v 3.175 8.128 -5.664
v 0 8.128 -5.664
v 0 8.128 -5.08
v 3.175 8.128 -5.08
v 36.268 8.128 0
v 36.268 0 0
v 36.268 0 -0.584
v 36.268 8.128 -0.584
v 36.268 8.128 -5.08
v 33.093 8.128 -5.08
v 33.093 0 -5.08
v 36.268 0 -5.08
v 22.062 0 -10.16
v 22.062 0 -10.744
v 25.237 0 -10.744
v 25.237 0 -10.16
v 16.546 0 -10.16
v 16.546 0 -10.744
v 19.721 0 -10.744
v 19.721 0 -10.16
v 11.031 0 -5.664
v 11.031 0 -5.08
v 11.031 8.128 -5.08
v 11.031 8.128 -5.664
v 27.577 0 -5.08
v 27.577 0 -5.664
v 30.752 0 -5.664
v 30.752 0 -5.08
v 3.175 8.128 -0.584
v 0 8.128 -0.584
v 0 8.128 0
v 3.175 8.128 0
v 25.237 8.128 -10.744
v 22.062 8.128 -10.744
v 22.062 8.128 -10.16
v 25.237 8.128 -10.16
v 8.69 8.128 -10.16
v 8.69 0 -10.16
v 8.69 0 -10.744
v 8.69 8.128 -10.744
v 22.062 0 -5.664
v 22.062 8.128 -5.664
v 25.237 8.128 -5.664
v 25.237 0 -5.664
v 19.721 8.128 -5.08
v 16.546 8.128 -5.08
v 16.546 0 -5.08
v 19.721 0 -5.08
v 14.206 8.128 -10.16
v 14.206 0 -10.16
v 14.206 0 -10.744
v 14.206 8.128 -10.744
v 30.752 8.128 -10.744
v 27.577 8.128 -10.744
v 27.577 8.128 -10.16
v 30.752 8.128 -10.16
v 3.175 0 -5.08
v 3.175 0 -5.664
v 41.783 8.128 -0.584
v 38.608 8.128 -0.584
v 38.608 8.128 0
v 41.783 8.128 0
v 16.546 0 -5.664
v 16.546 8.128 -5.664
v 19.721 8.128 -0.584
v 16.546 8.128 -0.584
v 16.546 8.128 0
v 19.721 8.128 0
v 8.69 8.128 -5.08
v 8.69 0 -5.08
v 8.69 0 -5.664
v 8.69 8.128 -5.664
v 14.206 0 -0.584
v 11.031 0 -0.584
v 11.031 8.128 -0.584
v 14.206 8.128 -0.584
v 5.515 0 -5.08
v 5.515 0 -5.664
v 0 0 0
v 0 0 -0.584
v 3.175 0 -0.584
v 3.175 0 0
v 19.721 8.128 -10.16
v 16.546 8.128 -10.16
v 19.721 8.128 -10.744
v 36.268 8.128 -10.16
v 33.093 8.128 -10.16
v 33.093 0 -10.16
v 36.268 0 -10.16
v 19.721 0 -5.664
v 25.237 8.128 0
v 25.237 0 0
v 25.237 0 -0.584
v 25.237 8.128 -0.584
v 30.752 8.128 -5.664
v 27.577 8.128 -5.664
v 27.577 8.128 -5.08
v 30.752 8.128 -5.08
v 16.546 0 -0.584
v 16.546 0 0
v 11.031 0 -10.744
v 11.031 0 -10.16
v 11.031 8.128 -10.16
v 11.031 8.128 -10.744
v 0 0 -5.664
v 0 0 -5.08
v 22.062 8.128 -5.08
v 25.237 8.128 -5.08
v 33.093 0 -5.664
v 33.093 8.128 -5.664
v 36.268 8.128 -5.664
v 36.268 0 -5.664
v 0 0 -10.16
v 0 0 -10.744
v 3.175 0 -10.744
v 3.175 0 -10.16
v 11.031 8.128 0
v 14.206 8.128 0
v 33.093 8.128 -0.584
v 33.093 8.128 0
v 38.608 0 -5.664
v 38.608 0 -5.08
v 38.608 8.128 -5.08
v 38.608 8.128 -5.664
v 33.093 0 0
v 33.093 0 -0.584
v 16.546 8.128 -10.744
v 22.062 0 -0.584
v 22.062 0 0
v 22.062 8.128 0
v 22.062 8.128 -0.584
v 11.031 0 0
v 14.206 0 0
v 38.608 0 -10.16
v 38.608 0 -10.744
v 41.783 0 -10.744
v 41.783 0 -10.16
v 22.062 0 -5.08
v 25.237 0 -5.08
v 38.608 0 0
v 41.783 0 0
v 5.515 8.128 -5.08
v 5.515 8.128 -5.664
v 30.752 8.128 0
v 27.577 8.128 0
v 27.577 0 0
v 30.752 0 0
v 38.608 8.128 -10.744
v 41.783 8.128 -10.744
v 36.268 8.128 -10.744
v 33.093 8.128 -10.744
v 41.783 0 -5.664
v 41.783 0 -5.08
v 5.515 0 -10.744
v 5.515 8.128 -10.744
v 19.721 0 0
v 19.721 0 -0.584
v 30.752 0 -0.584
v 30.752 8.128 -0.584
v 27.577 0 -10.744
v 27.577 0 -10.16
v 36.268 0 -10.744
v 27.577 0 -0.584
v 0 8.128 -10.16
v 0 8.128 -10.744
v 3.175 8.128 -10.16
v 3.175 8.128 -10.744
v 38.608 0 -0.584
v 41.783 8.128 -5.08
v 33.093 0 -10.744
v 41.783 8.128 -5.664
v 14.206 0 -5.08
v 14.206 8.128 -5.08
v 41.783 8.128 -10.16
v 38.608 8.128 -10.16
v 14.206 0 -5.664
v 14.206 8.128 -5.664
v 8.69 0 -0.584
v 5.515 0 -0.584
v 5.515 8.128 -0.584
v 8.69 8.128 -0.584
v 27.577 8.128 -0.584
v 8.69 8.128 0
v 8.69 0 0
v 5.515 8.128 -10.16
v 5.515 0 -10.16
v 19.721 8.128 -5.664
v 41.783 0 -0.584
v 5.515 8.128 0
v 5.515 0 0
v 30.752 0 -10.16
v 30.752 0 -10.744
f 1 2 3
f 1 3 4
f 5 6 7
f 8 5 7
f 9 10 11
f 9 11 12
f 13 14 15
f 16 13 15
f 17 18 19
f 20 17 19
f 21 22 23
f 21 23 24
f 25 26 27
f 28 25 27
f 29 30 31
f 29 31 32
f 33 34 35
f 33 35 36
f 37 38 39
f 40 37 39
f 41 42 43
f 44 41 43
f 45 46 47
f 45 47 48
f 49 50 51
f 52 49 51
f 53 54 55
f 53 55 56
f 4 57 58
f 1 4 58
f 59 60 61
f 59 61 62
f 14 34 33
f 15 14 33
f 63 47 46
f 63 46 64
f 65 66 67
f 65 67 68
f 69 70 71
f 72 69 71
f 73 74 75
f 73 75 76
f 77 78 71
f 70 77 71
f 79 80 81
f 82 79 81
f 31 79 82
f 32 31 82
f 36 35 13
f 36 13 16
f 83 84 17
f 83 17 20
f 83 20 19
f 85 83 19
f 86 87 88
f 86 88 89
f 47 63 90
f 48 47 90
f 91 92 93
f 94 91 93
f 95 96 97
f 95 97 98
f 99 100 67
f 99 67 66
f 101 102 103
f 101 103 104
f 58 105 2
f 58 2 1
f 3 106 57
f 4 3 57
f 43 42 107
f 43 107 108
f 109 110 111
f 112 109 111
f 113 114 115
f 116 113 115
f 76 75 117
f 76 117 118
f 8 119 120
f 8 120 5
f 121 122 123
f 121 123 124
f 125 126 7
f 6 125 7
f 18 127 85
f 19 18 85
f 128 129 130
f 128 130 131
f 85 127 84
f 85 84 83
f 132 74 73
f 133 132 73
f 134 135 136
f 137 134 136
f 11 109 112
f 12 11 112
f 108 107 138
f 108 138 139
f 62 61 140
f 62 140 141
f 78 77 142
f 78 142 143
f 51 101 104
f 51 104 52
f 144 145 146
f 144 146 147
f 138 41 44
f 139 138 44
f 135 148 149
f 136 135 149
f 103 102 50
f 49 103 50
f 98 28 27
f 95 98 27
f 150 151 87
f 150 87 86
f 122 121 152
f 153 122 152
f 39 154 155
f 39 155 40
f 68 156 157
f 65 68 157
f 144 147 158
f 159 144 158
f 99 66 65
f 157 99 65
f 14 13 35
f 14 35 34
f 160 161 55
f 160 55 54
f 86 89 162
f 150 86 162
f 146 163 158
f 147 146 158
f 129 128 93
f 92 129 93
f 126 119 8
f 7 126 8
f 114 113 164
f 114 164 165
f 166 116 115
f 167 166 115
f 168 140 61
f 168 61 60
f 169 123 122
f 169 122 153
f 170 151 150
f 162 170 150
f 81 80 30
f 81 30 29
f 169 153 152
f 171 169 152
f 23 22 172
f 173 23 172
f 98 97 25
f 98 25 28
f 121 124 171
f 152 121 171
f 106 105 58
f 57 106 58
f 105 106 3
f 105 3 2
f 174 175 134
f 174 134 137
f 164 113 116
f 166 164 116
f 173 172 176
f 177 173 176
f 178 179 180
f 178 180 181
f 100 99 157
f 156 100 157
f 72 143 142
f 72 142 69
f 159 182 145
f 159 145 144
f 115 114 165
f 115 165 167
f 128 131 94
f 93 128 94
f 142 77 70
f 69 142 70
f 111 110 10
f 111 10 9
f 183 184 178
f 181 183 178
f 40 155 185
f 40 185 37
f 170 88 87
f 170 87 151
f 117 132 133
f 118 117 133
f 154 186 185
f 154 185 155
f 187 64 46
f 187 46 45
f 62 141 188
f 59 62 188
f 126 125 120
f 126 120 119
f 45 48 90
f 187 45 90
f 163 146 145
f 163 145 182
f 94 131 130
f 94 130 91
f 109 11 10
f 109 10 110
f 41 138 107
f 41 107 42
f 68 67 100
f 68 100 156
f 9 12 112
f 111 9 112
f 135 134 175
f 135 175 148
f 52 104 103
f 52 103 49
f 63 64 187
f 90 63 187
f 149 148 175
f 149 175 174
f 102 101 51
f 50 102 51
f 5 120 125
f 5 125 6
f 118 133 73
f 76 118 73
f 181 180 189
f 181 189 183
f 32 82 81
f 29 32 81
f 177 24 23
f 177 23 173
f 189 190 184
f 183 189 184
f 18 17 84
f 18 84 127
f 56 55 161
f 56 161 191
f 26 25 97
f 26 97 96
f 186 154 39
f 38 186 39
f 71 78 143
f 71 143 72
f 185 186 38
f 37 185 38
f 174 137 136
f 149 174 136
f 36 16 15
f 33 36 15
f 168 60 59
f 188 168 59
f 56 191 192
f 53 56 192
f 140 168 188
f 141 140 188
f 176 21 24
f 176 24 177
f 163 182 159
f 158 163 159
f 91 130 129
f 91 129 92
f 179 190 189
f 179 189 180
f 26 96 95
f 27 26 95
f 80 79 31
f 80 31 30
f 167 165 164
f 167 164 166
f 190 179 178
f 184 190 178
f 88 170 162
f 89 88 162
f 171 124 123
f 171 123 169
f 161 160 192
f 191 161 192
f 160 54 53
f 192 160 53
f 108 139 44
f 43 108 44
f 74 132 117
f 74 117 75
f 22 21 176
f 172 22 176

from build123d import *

# Parameters (mm, degrees)
SKETCH1_W              = 3.175
SKETCH1_H              = 0.5842
BOSS_EXTRUDE1_DEPTH    = 8.128
BOSS_EXTRUDE1_2_DEPTH  = 8.128
BOSS_EXTRUDE1_3_DEPTH  = 8.128
BOSS_EXTRUDE1_4_DEPTH  = 8.128
BOSS_EXTRUDE1_5_DEPTH  = 8.128
BOSS_EXTRUDE1_6_DEPTH  = 8.128
BOSS_EXTRUDE1_7_DEPTH  = 8.128
BOSS_EXTRUDE1_8_DEPTH  = 8.128
BOSS_EXTRUDE1_9_DEPTH  = 8.128
BOSS_EXTRUDE1_10_DEPTH = 8.128
BOSS_EXTRUDE1_11_DEPTH = 8.128
BOSS_EXTRUDE1_12_DEPTH = 8.128
BOSS_EXTRUDE1_13_DEPTH = 8.128
BOSS_EXTRUDE1_14_DEPTH = 8.128
BOSS_EXTRUDE1_15_DEPTH = 8.128
BOSS_EXTRUDE1_16_DEPTH = 8.128
BOSS_EXTRUDE1_17_DEPTH = 8.128
BOSS_EXTRUDE1_18_DEPTH = 8.128
BOSS_EXTRUDE1_19_DEPTH = 8.128
BOSS_EXTRUDE1_20_DEPTH = 8.128
BOSS_EXTRUDE1_21_DEPTH = 8.128
BOSS_EXTRUDE1_22_DEPTH = 8.128
BOSS_EXTRUDE1_23_DEPTH = 8.128
BOSS_EXTRUDE1_24_DEPTH = 8.128


with BuildPart() as part:
    # Sketch1 → Boss-Extrude1 (new body)
    with BuildSketch(Plane(origin=(0, 0, 0), x_dir=(1, 0, 0), z_dir=(0, 1, 0))):
        with Locations((7.102928571, 0.2921)):
            Rectangle(SKETCH1_W, SKETCH1_H)
    extrude(amount=BOSS_EXTRUDE1_DEPTH)


with BuildPart() as body_2:
    # Sketch1 → Boss-Extrude1 2 (new body)
    with BuildSketch(Plane(origin=(0, 0, 0), x_dir=(1, 0, 0), z_dir=(0, 1, 0))):
        with Locations((1.5875, 0.2921)):
            Rectangle(SKETCH1_W, SKETCH1_H)
    extrude(amount=BOSS_EXTRUDE1_2_DEPTH)


with BuildPart() as body_3:
    # Sketch1 → Boss-Extrude1 3 (new body)
    with BuildSketch(Plane(origin=(0, 0, 0), x_dir=(1, 0, 0), z_dir=(0, 1, 0))):
        with Locations((12.618357143, 0.2921)):
            Rectangle(SKETCH1_W, SKETCH1_H)
    extrude(amount=BOSS_EXTRUDE1_3_DEPTH)


with BuildPart() as body_4:
    # Sketch1 → Boss-Extrude1 4 (new body)
    with BuildSketch(Plane(origin=(0, 0, 0), x_dir=(1, 0, 0), z_dir=(0, 1, 0))):
        with Locations((18.133785714, 0.2921)):
            Rectangle(SKETCH1_W, SKETCH1_H)
    extrude(amount=BOSS_EXTRUDE1_4_DEPTH)


with BuildPart() as body_5:
    # Sketch1 → Boss-Extrude1 5 (new body)
    with BuildSketch(Plane(origin=(0, 0, 0), x_dir=(1, 0, 0), z_dir=(0, 1, 0))):
        with Locations((23.649214286, 0.2921)):
            Rectangle(SKETCH1_W, SKETCH1_H)
    extrude(amount=BOSS_EXTRUDE1_5_DEPTH)


with BuildPart() as body_6:
    # Sketch1 → Boss-Extrude1 6 (new body)
    with BuildSketch(Plane(origin=(0, 0, 0), x_dir=(1, 0, 0), z_dir=(0, 1, 0))):
        with Locations((29.164642857, 0.2921)):
            Rectangle(SKETCH1_W, SKETCH1_H)
    extrude(amount=BOSS_EXTRUDE1_6_DEPTH)


with BuildPart() as body_7:
    # Sketch1 → Boss-Extrude1 7 (new body)
    with BuildSketch(Plane(origin=(0, 0, 0), x_dir=(1, 0, 0), z_dir=(0, 1, 0))):
        with Locations((34.680071429, 0.2921)):
            Rectangle(SKETCH1_W, SKETCH1_H)
    extrude(amount=BOSS_EXTRUDE1_7_DEPTH)


with BuildPart() as body_8:
    # Sketch1 → Boss-Extrude1 8 (new body)
    with BuildSketch(Plane(origin=(0, 0, 0), x_dir=(1, 0, 0), z_dir=(0, 1, 0))):
        with Locations((40.1955, 0.2921)):
            Rectangle(SKETCH1_W, SKETCH1_H)
    extrude(amount=BOSS_EXTRUDE1_8_DEPTH)


with BuildPart() as body_9:
    # Sketch1 → Boss-Extrude1 9 (new body)
    with BuildSketch(Plane(origin=(0, 0, 0), x_dir=(1, 0, 0), z_dir=(0, 1, 0))):
        with Locations((7.102928571, 5.3721)):
            Rectangle(SKETCH1_W, SKETCH1_H)
    extrude(amount=BOSS_EXTRUDE1_9_DEPTH)


with BuildPart() as body_10:
    # Sketch1 → Boss-Extrude1 10 (new body)
    with BuildSketch(Plane(origin=(0, 0, 0), x_dir=(1, 0, 0), z_dir=(0, 1, 0))):
        with Locations((1.5875, 5.3721)):
            Rectangle(SKETCH1_W, SKETCH1_H)
    extrude(amount=BOSS_EXTRUDE1_10_DEPTH)


with BuildPart() as body_11:
    # Sketch1 → Boss-Extrude1 11 (new body)
    with BuildSketch(Plane(origin=(0, 0, 0), x_dir=(1, 0, 0), z_dir=(0, 1, 0))):
        with Locations((12.618357143, 5.3721)):
            Rectangle(SKETCH1_W, SKETCH1_H)
    extrude(amount=BOSS_EXTRUDE1_11_DEPTH)


with BuildPart() as body_12:
    # Sketch1 → Boss-Extrude1 12 (new body)
    with BuildSketch(Plane(origin=(0, 0, 0), x_dir=(1, 0, 0), z_dir=(0, 1, 0))):
        with Locations((18.133785714, 5.3721)):
            Rectangle(SKETCH1_W, SKETCH1_H)
    extrude(amount=BOSS_EXTRUDE1_12_DEPTH)


with BuildPart() as body_13:
    # Sketch1 → Boss-Extrude1 13 (new body)
    with BuildSketch(Plane(origin=(0, 0, 0), x_dir=(1, 0, 0), z_dir=(0, 1, 0))):
        with Locations((23.649214286, 5.3721)):
            Rectangle(SKETCH1_W, SKETCH1_H)
    extrude(amount=BOSS_EXTRUDE1_13_DEPTH)


with BuildPart() as body_14:
    # Sketch1 → Boss-Extrude1 14 (new body)
    with BuildSketch(Plane(origin=(0, 0, 0), x_dir=(1, 0, 0), z_dir=(0, 1, 0))):
        with Locations((29.164642857, 5.3721)):
            Rectangle(SKETCH1_W, SKETCH1_H)
    extrude(amount=BOSS_EXTRUDE1_14_DEPTH)


with BuildPart() as body_15:
    # Sketch1 → Boss-Extrude1 15 (new body)
    with BuildSketch(Plane(origin=(0, 0, 0), x_dir=(1, 0, 0), z_dir=(0, 1, 0))):
        with Locations((34.680071429, 5.3721)):
            Rectangle(SKETCH1_W, SKETCH1_H)
    extrude(amount=BOSS_EXTRUDE1_15_DEPTH)


with BuildPart() as body_16:
    # Sketch1 → Boss-Extrude1 16 (new body)
    with BuildSketch(Plane(origin=(0, 0, 0), x_dir=(1, 0, 0), z_dir=(0, 1, 0))):
        with Locations((40.1955, 5.3721)):
            Rectangle(SKETCH1_W, SKETCH1_H)
    extrude(amount=BOSS_EXTRUDE1_16_DEPTH)


with BuildPart() as body_17:
    # Sketch1 → Boss-Extrude1 17 (new body)
    with BuildSketch(Plane(origin=(0, 0, 0), x_dir=(1, 0, 0), z_dir=(0, 1, 0))):
        with Locations((7.102928571, 10.4521)):
            Rectangle(SKETCH1_W, SKETCH1_H)
    extrude(amount=BOSS_EXTRUDE1_17_DEPTH)


with BuildPart() as body_18:
    # Sketch1 → Boss-Extrude1 18 (new body)
    with BuildSketch(Plane(origin=(0, 0, 0), x_dir=(1, 0, 0), z_dir=(0, 1, 0))):
        with Locations((1.5875, 10.4521)):
            Rectangle(SKETCH1_W, SKETCH1_H)
    extrude(amount=BOSS_EXTRUDE1_18_DEPTH)


with BuildPart() as body_19:
    # Sketch1 → Boss-Extrude1 19 (new body)
    with BuildSketch(Plane(origin=(0, 0, 0), x_dir=(1, 0, 0), z_dir=(0, 1, 0))):
        with Locations((12.618357143, 10.4521)):
            Rectangle(SKETCH1_W, SKETCH1_H)
    extrude(amount=BOSS_EXTRUDE1_19_DEPTH)


with BuildPart() as body_20:
    # Sketch1 → Boss-Extrude1 20 (new body)
    with BuildSketch(Plane(origin=(0, 0, 0), x_dir=(1, 0, 0), z_dir=(0, 1, 0))):
        with Locations((18.133785714, 10.4521)):
            Rectangle(SKETCH1_W, SKETCH1_H)
    extrude(amount=BOSS_EXTRUDE1_20_DEPTH)


with BuildPart() as body_21:
    # Sketch1 → Boss-Extrude1 21 (new body)
    with BuildSketch(Plane(origin=(0, 0, 0), x_dir=(1, 0, 0), z_dir=(0, 1, 0))):
        with Locations((23.649214286, 10.4521)):
            Rectangle(SKETCH1_W, SKETCH1_H)
    extrude(amount=BOSS_EXTRUDE1_21_DEPTH)


with BuildPart() as body_22:
    # Sketch1 → Boss-Extrude1 22 (new body)
    with BuildSketch(Plane(origin=(0, 0, 0), x_dir=(1, 0, 0), z_dir=(0, 1, 0))):
        with Locations((29.164642857, 10.4521)):
            Rectangle(SKETCH1_W, SKETCH1_H)
    extrude(amount=BOSS_EXTRUDE1_22_DEPTH)


with BuildPart() as body_23:
    # Sketch1 → Boss-Extrude1 23 (new body)
    with BuildSketch(Plane(origin=(0, 0, 0), x_dir=(1, 0, 0), z_dir=(0, 1, 0))):
        with Locations((34.680071429, 10.4521)):
            Rectangle(SKETCH1_W, SKETCH1_H)
    extrude(amount=BOSS_EXTRUDE1_23_DEPTH)


with BuildPart() as body_24:
    # Sketch1 → Boss-Extrude1 24 (new body)
    with BuildSketch(Plane(origin=(0, 0, 0), x_dir=(1, 0, 0), z_dir=(0, 1, 0))):
        with Locations((40.1955, 10.4521)):
            Rectangle(SKETCH1_W, SKETCH1_H)
    extrude(amount=BOSS_EXTRUDE1_24_DEPTH)


solid = Compound([part.part, body_2.part, body_3.part, body_4.part, body_5.part, body_6.part, body_7.part, body_8.part, body_9.part, body_10.part, body_11.part, body_12.part, body_13.part, body_14.part, body_15.part, body_16.part, body_17.part, body_18.part, body_19.part, body_20.part, body_21.part, body_22.part, body_23.part, body_24.part])
